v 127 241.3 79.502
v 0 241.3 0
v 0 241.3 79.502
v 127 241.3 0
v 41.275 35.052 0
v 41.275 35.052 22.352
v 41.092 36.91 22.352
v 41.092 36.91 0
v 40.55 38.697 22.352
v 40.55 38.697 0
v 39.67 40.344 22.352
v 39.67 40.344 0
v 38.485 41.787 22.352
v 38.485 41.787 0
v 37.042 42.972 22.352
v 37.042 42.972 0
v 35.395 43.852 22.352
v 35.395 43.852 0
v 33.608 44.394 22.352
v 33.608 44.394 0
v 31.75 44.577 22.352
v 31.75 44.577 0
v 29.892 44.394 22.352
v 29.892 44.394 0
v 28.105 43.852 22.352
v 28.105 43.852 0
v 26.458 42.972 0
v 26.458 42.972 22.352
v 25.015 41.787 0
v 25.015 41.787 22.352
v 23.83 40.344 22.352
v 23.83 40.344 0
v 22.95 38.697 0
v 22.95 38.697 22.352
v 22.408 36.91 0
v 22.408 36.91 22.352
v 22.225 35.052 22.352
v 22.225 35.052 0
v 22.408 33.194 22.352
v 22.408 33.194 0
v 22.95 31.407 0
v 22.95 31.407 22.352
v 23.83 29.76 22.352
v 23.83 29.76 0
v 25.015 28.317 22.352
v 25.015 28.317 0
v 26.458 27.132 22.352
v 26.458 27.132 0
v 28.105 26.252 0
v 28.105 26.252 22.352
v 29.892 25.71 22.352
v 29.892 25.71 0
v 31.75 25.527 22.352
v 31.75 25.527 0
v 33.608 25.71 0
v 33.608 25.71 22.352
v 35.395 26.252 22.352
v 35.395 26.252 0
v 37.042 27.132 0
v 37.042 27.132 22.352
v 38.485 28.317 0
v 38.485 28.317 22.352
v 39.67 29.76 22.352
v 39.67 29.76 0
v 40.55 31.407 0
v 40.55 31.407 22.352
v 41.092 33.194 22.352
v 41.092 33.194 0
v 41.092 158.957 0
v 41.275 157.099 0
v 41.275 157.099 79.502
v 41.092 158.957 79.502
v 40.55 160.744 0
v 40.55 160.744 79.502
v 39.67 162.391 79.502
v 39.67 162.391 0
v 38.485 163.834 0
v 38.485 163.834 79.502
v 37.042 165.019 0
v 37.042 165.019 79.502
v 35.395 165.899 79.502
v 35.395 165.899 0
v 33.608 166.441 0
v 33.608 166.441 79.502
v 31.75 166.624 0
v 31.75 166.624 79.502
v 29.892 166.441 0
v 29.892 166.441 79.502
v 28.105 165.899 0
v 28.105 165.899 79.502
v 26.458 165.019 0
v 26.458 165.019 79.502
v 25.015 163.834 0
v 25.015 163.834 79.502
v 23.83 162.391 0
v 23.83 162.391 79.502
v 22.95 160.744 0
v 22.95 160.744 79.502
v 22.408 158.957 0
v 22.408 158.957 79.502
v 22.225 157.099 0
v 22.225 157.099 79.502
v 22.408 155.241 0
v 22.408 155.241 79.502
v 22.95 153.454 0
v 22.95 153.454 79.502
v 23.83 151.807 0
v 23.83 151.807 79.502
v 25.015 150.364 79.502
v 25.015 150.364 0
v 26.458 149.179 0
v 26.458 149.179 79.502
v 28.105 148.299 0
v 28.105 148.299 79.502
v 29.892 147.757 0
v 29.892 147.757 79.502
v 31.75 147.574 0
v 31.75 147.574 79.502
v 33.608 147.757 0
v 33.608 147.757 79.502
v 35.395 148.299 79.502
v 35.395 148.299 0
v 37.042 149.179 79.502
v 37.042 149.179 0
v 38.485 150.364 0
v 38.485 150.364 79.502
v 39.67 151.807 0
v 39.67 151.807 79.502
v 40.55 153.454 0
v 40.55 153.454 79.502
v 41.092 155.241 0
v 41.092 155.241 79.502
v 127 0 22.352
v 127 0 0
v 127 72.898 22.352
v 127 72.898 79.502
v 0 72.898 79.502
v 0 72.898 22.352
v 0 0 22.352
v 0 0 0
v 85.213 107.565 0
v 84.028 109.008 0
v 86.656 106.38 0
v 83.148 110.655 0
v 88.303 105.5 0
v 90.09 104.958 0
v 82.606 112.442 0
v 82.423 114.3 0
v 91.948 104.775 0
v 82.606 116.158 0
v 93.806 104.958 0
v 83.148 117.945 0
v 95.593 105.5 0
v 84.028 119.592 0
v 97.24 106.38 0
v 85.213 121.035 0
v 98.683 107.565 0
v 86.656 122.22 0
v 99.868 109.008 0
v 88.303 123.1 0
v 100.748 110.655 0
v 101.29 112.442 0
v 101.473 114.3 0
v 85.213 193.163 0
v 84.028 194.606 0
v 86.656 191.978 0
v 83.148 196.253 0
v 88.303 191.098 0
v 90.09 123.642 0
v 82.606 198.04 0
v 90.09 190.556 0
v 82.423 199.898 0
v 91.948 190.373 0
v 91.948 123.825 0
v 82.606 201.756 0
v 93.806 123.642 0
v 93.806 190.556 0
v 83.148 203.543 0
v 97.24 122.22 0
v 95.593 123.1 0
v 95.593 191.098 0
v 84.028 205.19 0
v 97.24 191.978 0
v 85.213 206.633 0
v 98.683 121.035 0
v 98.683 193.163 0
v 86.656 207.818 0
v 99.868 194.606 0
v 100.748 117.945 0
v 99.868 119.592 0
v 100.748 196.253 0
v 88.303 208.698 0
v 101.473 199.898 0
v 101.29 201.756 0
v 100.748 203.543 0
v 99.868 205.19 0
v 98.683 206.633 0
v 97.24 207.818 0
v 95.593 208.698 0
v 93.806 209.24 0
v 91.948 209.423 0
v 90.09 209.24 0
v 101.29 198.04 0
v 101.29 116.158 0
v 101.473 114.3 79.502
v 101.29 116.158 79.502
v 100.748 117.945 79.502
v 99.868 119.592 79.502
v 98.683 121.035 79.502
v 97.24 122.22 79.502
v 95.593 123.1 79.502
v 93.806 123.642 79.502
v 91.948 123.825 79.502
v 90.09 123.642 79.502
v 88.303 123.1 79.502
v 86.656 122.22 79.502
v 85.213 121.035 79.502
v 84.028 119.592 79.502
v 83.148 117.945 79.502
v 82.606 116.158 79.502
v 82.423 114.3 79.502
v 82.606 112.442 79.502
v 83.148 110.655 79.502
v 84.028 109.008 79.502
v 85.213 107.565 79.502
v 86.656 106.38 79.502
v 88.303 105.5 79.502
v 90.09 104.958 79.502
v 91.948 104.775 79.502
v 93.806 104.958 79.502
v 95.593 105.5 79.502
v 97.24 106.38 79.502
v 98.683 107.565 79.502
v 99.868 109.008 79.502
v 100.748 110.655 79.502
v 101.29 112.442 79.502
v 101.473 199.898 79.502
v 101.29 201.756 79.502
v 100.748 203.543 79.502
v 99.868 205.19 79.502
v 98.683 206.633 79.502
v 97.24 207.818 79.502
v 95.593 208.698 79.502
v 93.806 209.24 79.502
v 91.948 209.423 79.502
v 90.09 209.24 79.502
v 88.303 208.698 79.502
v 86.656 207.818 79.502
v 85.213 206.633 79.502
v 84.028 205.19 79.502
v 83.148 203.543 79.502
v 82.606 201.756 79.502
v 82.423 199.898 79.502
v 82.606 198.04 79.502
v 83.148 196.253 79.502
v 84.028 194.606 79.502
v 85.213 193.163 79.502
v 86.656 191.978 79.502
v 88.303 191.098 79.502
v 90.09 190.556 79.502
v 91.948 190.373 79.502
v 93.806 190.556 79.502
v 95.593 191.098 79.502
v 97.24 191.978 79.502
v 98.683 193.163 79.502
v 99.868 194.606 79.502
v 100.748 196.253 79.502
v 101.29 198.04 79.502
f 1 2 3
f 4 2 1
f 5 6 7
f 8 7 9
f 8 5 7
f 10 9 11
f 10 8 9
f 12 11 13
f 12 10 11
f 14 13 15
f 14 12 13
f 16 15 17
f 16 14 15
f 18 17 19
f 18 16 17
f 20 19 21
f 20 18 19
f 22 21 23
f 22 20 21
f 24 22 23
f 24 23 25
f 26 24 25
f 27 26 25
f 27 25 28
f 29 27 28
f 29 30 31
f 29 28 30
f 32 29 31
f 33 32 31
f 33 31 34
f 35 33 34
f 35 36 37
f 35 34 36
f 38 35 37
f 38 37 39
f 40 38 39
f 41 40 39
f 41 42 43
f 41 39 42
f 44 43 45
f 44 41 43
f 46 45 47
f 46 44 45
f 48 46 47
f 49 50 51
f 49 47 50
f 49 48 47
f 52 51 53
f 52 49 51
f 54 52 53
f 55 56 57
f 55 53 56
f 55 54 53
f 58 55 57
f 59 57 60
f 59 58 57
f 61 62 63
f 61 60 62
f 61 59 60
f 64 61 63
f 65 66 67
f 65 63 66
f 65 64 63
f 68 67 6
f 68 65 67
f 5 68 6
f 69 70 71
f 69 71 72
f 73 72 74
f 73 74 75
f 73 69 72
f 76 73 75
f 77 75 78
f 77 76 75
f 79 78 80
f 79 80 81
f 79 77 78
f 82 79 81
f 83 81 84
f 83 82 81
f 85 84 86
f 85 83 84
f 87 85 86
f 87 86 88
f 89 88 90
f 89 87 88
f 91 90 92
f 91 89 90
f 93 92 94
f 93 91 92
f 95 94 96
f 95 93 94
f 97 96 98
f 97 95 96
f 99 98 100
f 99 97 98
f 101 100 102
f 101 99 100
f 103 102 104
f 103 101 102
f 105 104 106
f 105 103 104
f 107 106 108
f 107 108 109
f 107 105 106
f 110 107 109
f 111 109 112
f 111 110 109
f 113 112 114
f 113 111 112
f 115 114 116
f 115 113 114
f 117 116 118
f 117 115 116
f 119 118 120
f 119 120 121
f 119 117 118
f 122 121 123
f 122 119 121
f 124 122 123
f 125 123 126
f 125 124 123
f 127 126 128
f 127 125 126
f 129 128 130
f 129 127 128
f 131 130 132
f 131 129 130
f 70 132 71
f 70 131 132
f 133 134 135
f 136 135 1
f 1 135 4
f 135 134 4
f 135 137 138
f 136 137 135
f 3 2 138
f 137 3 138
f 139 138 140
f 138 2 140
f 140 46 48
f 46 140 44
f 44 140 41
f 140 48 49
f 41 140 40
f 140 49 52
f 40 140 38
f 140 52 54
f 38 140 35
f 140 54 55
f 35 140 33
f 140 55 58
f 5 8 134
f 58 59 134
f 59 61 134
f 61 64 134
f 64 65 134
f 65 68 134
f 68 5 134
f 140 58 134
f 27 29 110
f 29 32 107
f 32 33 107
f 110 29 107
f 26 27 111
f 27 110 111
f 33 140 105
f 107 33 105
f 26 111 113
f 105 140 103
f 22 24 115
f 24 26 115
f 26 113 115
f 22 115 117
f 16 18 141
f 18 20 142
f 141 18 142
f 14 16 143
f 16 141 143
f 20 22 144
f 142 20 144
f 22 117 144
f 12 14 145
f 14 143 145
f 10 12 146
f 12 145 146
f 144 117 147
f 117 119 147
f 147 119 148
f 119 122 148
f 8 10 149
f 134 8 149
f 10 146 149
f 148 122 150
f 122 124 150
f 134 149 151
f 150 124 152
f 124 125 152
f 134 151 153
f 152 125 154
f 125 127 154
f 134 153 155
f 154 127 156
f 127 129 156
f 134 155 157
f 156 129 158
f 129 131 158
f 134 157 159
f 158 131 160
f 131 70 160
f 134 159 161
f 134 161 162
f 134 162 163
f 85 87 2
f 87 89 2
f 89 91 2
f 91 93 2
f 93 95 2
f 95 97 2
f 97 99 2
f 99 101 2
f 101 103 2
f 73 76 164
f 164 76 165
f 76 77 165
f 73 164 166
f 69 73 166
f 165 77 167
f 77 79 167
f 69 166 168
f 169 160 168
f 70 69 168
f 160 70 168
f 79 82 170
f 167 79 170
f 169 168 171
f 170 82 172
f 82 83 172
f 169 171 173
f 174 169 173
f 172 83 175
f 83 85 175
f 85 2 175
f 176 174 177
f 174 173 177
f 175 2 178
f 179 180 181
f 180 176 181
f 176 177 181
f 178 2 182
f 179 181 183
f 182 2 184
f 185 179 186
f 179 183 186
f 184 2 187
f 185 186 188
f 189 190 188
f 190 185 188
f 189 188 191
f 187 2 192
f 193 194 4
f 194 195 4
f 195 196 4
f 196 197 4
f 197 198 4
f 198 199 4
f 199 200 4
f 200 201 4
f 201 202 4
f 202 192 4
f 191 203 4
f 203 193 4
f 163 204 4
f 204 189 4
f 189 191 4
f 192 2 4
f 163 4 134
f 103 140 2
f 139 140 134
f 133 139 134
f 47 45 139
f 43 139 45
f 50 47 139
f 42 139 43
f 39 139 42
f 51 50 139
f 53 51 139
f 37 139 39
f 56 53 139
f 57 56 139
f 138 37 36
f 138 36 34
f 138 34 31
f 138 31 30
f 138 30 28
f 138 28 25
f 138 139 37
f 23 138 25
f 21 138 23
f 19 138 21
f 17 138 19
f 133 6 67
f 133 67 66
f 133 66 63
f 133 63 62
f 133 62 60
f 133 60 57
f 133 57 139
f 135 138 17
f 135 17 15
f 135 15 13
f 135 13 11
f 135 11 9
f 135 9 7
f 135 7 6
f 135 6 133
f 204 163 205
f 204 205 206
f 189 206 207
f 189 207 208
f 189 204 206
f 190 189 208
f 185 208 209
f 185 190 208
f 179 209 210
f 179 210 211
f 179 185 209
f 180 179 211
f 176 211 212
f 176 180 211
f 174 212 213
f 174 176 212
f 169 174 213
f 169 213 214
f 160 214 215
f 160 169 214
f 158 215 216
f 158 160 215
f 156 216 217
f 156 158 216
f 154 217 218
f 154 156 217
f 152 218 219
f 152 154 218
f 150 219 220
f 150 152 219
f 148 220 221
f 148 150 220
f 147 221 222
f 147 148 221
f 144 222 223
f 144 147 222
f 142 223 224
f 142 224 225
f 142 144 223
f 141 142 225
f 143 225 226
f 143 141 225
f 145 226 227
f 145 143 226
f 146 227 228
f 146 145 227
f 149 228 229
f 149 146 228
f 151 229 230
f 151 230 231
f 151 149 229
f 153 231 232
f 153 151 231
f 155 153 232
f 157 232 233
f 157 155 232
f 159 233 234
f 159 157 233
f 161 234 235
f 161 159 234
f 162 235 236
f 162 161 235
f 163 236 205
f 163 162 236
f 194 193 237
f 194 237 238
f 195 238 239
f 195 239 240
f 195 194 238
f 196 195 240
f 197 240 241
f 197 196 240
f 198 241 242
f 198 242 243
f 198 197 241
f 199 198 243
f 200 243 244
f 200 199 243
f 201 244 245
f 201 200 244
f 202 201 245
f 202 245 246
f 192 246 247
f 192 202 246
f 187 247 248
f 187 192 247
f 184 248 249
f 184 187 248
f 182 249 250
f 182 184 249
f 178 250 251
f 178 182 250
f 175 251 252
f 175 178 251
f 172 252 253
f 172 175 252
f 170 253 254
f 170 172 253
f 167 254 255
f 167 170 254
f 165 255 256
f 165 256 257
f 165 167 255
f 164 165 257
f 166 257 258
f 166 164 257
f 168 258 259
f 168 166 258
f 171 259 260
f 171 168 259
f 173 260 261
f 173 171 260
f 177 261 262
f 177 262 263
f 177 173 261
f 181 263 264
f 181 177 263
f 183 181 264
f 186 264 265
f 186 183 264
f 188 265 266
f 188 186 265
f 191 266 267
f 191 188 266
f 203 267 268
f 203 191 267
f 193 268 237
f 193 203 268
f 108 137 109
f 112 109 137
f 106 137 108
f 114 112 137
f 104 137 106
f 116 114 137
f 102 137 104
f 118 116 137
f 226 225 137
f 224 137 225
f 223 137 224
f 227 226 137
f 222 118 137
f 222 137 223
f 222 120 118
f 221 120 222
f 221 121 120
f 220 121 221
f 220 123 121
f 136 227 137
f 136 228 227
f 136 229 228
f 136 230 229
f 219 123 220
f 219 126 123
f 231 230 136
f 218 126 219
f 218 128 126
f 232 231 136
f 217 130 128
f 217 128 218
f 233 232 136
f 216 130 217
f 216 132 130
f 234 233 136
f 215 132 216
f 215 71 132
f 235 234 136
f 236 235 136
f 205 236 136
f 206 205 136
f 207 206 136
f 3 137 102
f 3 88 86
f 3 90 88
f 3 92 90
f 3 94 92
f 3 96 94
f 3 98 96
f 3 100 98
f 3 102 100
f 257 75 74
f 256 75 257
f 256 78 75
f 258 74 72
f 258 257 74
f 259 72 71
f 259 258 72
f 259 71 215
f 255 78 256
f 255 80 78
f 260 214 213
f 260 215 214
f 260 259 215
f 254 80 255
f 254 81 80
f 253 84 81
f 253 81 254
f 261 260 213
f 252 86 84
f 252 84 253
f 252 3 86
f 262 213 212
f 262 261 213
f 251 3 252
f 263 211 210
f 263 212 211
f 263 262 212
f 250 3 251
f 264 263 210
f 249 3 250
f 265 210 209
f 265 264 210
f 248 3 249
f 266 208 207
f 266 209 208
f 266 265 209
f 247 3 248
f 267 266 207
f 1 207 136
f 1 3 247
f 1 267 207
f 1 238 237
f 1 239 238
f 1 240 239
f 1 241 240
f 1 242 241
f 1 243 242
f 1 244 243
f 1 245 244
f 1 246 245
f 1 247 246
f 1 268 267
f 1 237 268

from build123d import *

# Parameters (mm, degrees)
F0_W     = 127
F0_H     = 72.898
F0_R     = 9.525
F0_H_2   = 168.402
F1_DEPTH = 79.502
F2_W     = 127
F2_H     = 72.898
F3_DEPTH = 57.15


with BuildPart() as f1:
    # F0 (on Top) → F1 (new body)
    with BuildSketch(Plane.XY):
        with Locations((63.5, 36.449)):
            Rectangle(F0_W, F0_H)
        with Locations((31.75, 35.052)):
            Circle(F0_R, mode=Mode.SUBTRACT)
        with Locations((63.5, 157.099)):
            Rectangle(F0_W, F0_H_2)
        with Locations((91.948, 114.3)):
            Circle(F0_R, mode=Mode.SUBTRACT)
        with Locations((31.75, 157.099)):
            Circle(F0_R, mode=Mode.SUBTRACT)
        with Locations((91.948, 199.898)):
            Circle(F0_R, mode=Mode.SUBTRACT)
    extrude(amount=F1_DEPTH)

    # F2 (on face) → F3 (cut)
    with BuildSketch(Plane.XY.offset(79.502)):
        with Locations((63.5, 36.449)):
            Rectangle(F2_W, F2_H)
    extrude(amount=-F3_DEPTH, mode=Mode.SUBTRACT)


solid = f1.part
